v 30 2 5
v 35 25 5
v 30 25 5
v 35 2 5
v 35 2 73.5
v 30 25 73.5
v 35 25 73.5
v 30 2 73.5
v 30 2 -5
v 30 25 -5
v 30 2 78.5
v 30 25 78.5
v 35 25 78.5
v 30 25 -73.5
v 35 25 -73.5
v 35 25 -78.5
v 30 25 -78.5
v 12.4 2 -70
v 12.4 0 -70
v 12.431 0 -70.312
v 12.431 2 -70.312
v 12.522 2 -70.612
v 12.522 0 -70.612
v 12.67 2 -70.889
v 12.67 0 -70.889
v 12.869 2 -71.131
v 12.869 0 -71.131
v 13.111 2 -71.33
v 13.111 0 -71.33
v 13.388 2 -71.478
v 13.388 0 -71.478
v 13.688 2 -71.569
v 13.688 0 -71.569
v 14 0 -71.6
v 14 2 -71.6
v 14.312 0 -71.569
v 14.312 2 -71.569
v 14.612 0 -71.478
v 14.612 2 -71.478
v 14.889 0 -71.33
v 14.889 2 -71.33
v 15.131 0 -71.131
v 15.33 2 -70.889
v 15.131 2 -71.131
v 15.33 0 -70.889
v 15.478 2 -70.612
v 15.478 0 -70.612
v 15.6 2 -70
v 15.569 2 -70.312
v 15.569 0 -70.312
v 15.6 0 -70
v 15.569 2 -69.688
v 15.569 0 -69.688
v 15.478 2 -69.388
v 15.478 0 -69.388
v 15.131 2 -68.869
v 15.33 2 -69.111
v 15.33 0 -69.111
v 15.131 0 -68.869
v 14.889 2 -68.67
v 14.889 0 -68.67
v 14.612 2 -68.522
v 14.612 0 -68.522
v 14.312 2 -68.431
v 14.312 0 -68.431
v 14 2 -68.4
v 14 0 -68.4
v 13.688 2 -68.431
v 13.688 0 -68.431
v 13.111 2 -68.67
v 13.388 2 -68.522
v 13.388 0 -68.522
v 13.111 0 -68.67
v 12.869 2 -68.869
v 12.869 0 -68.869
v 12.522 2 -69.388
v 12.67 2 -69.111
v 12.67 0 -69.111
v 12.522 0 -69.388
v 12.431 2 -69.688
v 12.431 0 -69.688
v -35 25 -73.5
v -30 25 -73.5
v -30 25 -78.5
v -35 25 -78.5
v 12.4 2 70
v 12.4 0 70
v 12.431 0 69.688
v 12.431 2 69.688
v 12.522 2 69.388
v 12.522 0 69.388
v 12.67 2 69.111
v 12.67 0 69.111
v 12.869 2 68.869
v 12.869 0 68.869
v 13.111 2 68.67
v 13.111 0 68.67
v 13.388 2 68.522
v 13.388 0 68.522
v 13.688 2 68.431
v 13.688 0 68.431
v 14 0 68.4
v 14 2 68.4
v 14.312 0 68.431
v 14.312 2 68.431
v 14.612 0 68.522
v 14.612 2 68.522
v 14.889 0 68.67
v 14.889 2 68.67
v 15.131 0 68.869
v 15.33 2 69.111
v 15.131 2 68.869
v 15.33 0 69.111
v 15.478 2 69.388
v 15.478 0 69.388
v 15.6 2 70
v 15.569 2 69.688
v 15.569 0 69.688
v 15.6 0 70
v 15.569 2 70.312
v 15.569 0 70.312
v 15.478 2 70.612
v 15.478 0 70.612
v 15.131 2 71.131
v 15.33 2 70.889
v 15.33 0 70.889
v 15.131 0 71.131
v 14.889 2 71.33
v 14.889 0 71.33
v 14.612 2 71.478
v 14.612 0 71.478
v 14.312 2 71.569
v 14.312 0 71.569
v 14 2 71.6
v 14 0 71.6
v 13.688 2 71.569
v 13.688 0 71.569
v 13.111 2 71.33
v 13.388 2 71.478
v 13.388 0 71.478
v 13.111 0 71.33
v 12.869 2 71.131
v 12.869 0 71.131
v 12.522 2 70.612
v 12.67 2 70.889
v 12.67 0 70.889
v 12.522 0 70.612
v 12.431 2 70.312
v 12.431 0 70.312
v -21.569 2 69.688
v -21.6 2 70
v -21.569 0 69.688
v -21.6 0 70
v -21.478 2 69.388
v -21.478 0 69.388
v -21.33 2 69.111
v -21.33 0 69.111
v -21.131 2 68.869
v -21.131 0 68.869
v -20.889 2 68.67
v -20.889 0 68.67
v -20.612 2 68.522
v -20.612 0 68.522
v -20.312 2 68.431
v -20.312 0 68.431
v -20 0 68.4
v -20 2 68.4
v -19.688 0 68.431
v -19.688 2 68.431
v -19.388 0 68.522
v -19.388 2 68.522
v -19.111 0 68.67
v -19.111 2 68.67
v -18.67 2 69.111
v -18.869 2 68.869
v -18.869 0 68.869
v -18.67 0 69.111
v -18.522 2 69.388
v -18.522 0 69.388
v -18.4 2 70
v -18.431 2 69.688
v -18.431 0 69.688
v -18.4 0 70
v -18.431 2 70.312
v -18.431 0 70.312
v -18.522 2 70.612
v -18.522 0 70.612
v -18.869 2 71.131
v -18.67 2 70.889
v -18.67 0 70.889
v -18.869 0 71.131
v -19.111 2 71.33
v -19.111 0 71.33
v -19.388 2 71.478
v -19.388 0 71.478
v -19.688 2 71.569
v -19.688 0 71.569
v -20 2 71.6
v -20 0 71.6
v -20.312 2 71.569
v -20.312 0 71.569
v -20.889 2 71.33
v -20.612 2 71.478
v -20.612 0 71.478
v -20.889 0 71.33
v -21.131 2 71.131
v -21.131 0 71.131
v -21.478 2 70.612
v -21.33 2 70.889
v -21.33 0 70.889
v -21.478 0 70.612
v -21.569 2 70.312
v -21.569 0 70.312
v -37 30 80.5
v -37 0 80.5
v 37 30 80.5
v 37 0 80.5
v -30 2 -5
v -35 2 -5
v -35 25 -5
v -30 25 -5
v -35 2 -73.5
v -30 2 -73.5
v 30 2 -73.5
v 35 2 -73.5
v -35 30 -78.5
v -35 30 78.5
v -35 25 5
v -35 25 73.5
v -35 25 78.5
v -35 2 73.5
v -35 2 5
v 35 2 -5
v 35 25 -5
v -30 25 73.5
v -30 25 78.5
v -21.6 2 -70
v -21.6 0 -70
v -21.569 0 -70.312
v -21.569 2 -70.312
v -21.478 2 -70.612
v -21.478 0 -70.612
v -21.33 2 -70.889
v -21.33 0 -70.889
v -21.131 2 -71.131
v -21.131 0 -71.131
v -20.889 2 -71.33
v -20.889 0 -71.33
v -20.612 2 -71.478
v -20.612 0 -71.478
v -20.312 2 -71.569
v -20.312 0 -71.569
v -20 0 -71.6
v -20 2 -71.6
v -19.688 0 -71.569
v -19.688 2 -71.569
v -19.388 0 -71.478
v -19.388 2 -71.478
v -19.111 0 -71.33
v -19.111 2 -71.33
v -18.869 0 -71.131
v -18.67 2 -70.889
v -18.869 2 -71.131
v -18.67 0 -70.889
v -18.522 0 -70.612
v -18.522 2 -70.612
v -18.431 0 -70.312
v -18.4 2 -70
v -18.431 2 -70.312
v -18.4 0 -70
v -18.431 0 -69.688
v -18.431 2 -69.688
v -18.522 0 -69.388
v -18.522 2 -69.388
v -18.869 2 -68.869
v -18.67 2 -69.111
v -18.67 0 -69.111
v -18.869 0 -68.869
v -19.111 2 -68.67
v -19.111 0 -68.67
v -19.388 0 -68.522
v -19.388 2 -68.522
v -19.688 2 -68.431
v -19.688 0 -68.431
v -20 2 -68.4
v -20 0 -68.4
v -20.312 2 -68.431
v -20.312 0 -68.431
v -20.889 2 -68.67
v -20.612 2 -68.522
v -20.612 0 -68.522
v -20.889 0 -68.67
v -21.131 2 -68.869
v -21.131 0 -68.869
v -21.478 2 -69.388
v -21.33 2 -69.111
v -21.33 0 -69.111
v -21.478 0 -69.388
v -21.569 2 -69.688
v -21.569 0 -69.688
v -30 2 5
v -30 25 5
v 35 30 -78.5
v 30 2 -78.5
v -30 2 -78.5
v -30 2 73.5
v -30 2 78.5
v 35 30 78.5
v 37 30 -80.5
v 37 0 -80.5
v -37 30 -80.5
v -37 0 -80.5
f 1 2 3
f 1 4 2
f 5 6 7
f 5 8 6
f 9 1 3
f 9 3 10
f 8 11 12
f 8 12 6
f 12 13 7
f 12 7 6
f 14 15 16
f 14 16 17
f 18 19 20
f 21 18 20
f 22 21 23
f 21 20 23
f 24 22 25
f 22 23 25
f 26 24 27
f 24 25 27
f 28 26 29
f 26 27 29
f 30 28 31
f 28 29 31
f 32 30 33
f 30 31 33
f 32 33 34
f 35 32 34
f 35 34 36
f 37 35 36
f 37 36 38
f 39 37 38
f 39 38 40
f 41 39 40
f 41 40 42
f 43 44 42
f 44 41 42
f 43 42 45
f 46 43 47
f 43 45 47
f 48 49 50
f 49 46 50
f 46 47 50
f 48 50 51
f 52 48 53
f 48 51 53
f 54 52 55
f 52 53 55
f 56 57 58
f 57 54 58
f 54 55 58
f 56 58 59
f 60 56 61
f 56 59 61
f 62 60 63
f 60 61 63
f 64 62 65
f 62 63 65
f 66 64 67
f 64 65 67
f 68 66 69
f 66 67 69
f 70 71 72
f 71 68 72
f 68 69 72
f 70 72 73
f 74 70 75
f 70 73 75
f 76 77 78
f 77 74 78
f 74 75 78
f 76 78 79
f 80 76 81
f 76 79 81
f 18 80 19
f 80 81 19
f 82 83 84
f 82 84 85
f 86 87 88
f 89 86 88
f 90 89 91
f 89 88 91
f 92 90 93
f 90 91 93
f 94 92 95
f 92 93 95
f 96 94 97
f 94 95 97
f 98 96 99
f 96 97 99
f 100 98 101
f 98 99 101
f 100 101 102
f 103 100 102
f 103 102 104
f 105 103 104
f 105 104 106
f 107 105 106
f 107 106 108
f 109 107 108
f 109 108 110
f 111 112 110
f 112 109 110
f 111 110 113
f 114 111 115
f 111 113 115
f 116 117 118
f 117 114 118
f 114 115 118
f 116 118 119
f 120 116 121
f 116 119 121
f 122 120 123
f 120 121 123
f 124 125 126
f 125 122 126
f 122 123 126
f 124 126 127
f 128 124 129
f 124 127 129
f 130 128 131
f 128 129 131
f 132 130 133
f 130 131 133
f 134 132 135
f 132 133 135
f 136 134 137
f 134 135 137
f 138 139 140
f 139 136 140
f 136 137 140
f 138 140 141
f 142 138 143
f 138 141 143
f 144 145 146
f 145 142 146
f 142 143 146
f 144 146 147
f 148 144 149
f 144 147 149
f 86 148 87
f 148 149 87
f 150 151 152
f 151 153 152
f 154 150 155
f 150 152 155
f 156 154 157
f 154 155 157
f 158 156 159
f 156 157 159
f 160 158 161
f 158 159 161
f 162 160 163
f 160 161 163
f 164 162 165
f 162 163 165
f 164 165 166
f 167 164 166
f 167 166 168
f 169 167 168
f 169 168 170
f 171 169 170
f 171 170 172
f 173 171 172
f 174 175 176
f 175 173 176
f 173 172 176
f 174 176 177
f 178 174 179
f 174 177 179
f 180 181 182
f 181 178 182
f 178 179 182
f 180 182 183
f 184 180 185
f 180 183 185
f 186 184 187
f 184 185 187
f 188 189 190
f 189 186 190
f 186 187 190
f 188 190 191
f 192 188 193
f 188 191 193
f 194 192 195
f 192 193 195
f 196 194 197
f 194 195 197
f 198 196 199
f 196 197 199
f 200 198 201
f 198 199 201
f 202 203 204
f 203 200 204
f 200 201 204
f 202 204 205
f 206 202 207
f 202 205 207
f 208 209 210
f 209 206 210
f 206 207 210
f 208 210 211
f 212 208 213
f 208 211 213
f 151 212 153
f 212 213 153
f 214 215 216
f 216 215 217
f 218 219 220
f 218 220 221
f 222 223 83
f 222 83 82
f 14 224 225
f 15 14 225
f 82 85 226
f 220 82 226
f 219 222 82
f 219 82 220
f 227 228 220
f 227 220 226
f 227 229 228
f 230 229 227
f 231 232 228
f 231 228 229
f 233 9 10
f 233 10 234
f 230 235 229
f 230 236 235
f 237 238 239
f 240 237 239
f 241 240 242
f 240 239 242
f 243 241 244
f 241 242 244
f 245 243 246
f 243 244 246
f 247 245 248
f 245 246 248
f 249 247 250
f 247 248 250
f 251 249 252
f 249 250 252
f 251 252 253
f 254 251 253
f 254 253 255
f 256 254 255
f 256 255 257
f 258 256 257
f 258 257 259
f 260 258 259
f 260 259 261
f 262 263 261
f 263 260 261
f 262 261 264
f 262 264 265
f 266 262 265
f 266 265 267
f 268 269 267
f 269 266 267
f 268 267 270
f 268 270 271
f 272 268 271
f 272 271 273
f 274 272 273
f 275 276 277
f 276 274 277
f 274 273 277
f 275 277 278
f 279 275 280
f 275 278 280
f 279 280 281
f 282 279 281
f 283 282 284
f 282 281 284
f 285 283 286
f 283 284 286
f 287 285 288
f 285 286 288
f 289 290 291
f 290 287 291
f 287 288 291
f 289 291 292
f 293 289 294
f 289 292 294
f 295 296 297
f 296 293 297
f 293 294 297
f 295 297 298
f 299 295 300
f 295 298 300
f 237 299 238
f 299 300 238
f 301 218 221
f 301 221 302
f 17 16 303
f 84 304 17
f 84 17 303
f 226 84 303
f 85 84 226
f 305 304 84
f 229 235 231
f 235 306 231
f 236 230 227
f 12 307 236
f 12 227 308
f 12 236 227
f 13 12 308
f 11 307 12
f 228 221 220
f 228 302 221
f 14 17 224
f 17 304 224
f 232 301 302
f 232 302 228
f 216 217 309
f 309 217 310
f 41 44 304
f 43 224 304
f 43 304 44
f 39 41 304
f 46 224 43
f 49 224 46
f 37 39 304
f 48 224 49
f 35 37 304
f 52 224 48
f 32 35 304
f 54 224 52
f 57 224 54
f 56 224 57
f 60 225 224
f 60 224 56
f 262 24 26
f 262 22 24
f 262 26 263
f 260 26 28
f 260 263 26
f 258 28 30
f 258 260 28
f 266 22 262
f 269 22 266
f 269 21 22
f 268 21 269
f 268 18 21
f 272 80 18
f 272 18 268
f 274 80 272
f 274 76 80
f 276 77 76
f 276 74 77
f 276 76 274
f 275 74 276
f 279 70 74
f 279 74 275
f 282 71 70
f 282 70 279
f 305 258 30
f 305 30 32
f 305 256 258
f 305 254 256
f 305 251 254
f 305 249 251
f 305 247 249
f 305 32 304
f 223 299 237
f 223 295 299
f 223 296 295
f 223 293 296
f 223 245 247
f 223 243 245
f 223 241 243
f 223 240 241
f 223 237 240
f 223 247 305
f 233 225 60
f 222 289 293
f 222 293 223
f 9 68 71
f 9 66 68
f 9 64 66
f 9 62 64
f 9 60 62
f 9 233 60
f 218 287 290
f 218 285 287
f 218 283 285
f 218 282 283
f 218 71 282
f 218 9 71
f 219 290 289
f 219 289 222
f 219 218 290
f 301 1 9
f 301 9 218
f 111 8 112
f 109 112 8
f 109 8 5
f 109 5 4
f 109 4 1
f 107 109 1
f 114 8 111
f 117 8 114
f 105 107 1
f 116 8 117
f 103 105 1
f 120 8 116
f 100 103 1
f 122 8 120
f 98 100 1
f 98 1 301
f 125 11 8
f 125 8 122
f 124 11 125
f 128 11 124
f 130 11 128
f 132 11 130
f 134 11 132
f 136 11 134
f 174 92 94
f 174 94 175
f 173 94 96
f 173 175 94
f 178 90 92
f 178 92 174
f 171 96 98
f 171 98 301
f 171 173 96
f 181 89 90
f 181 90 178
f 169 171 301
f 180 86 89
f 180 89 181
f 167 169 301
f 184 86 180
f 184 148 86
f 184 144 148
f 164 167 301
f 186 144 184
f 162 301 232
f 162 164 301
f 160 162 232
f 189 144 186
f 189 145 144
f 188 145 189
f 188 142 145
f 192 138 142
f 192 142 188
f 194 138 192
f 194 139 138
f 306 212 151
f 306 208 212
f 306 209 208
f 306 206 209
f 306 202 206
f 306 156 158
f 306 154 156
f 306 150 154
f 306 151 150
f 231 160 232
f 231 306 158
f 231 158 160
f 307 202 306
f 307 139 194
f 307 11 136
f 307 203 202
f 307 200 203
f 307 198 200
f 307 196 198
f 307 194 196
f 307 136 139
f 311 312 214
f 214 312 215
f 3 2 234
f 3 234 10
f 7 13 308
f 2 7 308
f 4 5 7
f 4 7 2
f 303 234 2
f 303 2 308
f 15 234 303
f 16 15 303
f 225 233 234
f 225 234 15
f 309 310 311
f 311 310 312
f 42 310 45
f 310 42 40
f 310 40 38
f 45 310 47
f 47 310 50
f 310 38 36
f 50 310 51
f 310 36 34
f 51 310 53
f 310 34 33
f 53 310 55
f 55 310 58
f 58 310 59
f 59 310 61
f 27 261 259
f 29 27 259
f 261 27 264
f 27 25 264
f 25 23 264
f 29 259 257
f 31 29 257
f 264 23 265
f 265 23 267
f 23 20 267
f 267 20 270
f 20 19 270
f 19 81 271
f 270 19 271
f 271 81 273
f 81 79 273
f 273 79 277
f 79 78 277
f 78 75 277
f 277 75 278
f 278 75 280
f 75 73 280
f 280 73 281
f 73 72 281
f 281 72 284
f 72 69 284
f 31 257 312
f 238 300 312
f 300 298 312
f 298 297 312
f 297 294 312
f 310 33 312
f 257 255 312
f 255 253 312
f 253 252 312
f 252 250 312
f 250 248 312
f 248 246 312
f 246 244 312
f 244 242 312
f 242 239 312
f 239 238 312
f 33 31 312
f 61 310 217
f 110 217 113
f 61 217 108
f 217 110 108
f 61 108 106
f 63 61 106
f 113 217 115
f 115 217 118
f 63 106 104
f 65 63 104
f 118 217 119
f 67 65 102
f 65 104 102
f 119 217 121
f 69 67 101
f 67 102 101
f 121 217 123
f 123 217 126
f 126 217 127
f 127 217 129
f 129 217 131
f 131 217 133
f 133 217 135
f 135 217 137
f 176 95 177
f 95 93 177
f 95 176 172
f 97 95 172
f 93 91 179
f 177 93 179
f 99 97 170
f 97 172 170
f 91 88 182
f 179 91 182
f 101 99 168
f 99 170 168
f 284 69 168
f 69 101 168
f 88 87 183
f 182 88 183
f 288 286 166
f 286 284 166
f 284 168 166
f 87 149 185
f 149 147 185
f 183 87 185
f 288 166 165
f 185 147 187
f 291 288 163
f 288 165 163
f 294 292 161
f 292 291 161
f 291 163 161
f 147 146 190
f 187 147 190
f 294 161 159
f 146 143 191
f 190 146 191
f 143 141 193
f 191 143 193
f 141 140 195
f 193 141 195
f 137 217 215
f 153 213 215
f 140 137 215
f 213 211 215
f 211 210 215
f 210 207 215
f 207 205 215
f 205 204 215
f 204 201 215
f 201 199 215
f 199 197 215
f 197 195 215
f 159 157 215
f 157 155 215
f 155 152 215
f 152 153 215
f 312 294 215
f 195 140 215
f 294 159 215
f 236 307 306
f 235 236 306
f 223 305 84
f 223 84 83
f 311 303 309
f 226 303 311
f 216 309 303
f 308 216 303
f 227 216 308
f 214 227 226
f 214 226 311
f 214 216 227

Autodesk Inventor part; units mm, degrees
ref_plane "YZ Plane" through (0, 0, 0) normal (1, 0, 0) x (0, 1, 0)
ref_plane "XZ Plane" through (0, 0, 0) normal (0, 1, 0) x (-1, 0, 0)
ref_plane "XY Plane" through (0, 0, 0) normal (0, 0, 1) x (1, 0, 0)
sketch "Sketch1" plane through (0, 0, 0) normal (0, 1, 0) x (-1, 0, 0)
  line L0 (55, 0) -> (-69, 0) construction
  line L1 (0, 72) -> (0, -101) construction
  line L2 (35, 78.5) -> (-35, 78.5)
  line L3 (-35, 78.5) -> (-35, -78.5)
  line L4 (-35, -78.5) -> (35, -78.5)
  line L5 (35, -78.5) -> (35, 78.5)
  line L6 (35, 78.5) -> (-35, -78.5) construction
  line L7 (-35, 78.5) -> (35, -78.5) construction
  line L8 (37, 80.5) -> (-37, 80.5)
  line L9 (-37, 80.5) -> (-37, -80.5)
  line L10 (-37, -80.5) -> (37, -80.5)
  line L11 (37, -80.5) -> (37, 80.5)
  line L12 (37, 80.5) -> (-37, -80.5) construction
  line L13 (-37, 80.5) -> (37, -80.5) construction
  circle A0 centre (20, -70) radius 1.6
  circle A1 centre (20, -70) radius 2.75
  circle A2 centre (-14, -70) radius 1.6
  circle A3 centre (-14, -70) radius 2.75
  circle A4 centre (20, 70) radius 1.6
  circle A5 centre (20, 70) radius 2.75
  circle A6 centre (-14, 70) radius 1.6
  circle A7 centre (-14, 70) radius 2.75
  line L14 (35, 78.5) -> (30, 78.5)
  line L15 (30, 78.5) -> (30, 73.5)
  line L16 (30, 73.5) -> (35, 73.5)
  line L17 (35, 73.5) -> (35, 78.5)
  line L18 (-35, 78.5) -> (-30, 78.5)
  line L19 (-30, 78.5) -> (-30, 73.5)
  line L20 (-30, 73.5) -> (-35, 73.5)
  line L21 (-35, 73.5) -> (-35, 78.5)
  line L22 (35, -78.5) -> (30, -78.5)
  line L23 (30, -78.5) -> (30, -73.5)
  line L24 (30, -73.5) -> (35, -73.5)
  line L25 (35, -73.5) -> (35, -78.5)
  line L26 (-35, -78.5) -> (-30, -78.5)
  line L27 (-30, -78.5) -> (-30, -73.5)
  line L28 (-30, -73.5) -> (-35, -73.5)
  line L29 (-35, -73.5) -> (-35, -78.5)
  line L30 (40, -5) -> (30, -5)
  line L31 (30, -5) -> (30, 5)
  line L32 (30, 5) -> (40, 5)
  line L33 (40, 5) -> (40, -5)
  line L34 (40, -5) -> (30, 5) construction
  line L35 (30, -5) -> (40, 5) construction
  line L36 (-30, -5) -> (-40, -5)
  line L37 (-40, -5) -> (-40, 5)
  line L38 (-40, 5) -> (-30, 5)
  line L39 (-30, 5) -> (-30, -5)
  line L40 (-30, -5) -> (-40, 5) construction
  line L41 (-40, -5) -> (-30, 5) construction
  point P0 (0, 0)
  point P1 (35, 0)
  point P2 (-35, 0)
  point P3 (-35, 5)
  point P4 (-35, -5)
  point P5 (35, -5)
  point P6 (35, 5)
  dimension "d0" = 70
  dimension "d1" = 157
  dimension "d2" = 74
  dimension "d3" = 161
  dimension "d4" = 3.2
  dimension "d5" = 17
  dimension "d6" = 70
  dimension "d7" = 5.5
  dimension "d8" = 3.2
  dimension "d9" = 5.5
  dimension "d10" = 34
  dimension "d11" = 5
  dimension "d12" = 5
  dimension "d13" = 5
  dimension "d14" = 5
  dimension "d15" = 5
  dimension "d16" = 5
  dimension "d17" = 5
extrude "Extrusion1" add sketch "Sketch1" along normal blind 2 contours L15 L16 L5 L32 L31 L30 L24 L23 L4 L27 L28 L3 L36 L39 L38 L20 L19 L2 | L5 L30 L31 L32 | L38 L39 L36 L3 | A1 | A3 | A5 | A7
extrude "Extrusion2" add sketch "Sketch1" along normal blind 25 contours L5 L16 L15 L2 | L19 L20 L3 L2 | L5 L30 L31 L32 | L5 L4 L23 L24 | L38 L39 L36 L3 | L28 L27 L4 L3
extrude "Extrusion3" add sketch "Sketch1" along normal blind 30 contours L2 L3 L38 L9 L8 L11 L32 L5 | L32 L11 L30 L5 | L30 L11 L10 L9 L36 L3 L4 L5 | L3 L36 L9 L38
properties part number "Mounting Master_3DPrint"
